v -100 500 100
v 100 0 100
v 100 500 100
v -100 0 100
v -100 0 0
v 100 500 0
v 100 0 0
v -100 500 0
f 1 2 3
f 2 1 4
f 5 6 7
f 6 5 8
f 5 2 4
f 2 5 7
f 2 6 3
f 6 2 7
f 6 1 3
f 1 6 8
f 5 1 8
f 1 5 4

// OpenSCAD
tank_body(200, 500, 100);

module tank_body(width, depth, height)
{
    translate([-width / 2,0,0])
    {
        cube([width, depth, height], center = false);
    }
}
